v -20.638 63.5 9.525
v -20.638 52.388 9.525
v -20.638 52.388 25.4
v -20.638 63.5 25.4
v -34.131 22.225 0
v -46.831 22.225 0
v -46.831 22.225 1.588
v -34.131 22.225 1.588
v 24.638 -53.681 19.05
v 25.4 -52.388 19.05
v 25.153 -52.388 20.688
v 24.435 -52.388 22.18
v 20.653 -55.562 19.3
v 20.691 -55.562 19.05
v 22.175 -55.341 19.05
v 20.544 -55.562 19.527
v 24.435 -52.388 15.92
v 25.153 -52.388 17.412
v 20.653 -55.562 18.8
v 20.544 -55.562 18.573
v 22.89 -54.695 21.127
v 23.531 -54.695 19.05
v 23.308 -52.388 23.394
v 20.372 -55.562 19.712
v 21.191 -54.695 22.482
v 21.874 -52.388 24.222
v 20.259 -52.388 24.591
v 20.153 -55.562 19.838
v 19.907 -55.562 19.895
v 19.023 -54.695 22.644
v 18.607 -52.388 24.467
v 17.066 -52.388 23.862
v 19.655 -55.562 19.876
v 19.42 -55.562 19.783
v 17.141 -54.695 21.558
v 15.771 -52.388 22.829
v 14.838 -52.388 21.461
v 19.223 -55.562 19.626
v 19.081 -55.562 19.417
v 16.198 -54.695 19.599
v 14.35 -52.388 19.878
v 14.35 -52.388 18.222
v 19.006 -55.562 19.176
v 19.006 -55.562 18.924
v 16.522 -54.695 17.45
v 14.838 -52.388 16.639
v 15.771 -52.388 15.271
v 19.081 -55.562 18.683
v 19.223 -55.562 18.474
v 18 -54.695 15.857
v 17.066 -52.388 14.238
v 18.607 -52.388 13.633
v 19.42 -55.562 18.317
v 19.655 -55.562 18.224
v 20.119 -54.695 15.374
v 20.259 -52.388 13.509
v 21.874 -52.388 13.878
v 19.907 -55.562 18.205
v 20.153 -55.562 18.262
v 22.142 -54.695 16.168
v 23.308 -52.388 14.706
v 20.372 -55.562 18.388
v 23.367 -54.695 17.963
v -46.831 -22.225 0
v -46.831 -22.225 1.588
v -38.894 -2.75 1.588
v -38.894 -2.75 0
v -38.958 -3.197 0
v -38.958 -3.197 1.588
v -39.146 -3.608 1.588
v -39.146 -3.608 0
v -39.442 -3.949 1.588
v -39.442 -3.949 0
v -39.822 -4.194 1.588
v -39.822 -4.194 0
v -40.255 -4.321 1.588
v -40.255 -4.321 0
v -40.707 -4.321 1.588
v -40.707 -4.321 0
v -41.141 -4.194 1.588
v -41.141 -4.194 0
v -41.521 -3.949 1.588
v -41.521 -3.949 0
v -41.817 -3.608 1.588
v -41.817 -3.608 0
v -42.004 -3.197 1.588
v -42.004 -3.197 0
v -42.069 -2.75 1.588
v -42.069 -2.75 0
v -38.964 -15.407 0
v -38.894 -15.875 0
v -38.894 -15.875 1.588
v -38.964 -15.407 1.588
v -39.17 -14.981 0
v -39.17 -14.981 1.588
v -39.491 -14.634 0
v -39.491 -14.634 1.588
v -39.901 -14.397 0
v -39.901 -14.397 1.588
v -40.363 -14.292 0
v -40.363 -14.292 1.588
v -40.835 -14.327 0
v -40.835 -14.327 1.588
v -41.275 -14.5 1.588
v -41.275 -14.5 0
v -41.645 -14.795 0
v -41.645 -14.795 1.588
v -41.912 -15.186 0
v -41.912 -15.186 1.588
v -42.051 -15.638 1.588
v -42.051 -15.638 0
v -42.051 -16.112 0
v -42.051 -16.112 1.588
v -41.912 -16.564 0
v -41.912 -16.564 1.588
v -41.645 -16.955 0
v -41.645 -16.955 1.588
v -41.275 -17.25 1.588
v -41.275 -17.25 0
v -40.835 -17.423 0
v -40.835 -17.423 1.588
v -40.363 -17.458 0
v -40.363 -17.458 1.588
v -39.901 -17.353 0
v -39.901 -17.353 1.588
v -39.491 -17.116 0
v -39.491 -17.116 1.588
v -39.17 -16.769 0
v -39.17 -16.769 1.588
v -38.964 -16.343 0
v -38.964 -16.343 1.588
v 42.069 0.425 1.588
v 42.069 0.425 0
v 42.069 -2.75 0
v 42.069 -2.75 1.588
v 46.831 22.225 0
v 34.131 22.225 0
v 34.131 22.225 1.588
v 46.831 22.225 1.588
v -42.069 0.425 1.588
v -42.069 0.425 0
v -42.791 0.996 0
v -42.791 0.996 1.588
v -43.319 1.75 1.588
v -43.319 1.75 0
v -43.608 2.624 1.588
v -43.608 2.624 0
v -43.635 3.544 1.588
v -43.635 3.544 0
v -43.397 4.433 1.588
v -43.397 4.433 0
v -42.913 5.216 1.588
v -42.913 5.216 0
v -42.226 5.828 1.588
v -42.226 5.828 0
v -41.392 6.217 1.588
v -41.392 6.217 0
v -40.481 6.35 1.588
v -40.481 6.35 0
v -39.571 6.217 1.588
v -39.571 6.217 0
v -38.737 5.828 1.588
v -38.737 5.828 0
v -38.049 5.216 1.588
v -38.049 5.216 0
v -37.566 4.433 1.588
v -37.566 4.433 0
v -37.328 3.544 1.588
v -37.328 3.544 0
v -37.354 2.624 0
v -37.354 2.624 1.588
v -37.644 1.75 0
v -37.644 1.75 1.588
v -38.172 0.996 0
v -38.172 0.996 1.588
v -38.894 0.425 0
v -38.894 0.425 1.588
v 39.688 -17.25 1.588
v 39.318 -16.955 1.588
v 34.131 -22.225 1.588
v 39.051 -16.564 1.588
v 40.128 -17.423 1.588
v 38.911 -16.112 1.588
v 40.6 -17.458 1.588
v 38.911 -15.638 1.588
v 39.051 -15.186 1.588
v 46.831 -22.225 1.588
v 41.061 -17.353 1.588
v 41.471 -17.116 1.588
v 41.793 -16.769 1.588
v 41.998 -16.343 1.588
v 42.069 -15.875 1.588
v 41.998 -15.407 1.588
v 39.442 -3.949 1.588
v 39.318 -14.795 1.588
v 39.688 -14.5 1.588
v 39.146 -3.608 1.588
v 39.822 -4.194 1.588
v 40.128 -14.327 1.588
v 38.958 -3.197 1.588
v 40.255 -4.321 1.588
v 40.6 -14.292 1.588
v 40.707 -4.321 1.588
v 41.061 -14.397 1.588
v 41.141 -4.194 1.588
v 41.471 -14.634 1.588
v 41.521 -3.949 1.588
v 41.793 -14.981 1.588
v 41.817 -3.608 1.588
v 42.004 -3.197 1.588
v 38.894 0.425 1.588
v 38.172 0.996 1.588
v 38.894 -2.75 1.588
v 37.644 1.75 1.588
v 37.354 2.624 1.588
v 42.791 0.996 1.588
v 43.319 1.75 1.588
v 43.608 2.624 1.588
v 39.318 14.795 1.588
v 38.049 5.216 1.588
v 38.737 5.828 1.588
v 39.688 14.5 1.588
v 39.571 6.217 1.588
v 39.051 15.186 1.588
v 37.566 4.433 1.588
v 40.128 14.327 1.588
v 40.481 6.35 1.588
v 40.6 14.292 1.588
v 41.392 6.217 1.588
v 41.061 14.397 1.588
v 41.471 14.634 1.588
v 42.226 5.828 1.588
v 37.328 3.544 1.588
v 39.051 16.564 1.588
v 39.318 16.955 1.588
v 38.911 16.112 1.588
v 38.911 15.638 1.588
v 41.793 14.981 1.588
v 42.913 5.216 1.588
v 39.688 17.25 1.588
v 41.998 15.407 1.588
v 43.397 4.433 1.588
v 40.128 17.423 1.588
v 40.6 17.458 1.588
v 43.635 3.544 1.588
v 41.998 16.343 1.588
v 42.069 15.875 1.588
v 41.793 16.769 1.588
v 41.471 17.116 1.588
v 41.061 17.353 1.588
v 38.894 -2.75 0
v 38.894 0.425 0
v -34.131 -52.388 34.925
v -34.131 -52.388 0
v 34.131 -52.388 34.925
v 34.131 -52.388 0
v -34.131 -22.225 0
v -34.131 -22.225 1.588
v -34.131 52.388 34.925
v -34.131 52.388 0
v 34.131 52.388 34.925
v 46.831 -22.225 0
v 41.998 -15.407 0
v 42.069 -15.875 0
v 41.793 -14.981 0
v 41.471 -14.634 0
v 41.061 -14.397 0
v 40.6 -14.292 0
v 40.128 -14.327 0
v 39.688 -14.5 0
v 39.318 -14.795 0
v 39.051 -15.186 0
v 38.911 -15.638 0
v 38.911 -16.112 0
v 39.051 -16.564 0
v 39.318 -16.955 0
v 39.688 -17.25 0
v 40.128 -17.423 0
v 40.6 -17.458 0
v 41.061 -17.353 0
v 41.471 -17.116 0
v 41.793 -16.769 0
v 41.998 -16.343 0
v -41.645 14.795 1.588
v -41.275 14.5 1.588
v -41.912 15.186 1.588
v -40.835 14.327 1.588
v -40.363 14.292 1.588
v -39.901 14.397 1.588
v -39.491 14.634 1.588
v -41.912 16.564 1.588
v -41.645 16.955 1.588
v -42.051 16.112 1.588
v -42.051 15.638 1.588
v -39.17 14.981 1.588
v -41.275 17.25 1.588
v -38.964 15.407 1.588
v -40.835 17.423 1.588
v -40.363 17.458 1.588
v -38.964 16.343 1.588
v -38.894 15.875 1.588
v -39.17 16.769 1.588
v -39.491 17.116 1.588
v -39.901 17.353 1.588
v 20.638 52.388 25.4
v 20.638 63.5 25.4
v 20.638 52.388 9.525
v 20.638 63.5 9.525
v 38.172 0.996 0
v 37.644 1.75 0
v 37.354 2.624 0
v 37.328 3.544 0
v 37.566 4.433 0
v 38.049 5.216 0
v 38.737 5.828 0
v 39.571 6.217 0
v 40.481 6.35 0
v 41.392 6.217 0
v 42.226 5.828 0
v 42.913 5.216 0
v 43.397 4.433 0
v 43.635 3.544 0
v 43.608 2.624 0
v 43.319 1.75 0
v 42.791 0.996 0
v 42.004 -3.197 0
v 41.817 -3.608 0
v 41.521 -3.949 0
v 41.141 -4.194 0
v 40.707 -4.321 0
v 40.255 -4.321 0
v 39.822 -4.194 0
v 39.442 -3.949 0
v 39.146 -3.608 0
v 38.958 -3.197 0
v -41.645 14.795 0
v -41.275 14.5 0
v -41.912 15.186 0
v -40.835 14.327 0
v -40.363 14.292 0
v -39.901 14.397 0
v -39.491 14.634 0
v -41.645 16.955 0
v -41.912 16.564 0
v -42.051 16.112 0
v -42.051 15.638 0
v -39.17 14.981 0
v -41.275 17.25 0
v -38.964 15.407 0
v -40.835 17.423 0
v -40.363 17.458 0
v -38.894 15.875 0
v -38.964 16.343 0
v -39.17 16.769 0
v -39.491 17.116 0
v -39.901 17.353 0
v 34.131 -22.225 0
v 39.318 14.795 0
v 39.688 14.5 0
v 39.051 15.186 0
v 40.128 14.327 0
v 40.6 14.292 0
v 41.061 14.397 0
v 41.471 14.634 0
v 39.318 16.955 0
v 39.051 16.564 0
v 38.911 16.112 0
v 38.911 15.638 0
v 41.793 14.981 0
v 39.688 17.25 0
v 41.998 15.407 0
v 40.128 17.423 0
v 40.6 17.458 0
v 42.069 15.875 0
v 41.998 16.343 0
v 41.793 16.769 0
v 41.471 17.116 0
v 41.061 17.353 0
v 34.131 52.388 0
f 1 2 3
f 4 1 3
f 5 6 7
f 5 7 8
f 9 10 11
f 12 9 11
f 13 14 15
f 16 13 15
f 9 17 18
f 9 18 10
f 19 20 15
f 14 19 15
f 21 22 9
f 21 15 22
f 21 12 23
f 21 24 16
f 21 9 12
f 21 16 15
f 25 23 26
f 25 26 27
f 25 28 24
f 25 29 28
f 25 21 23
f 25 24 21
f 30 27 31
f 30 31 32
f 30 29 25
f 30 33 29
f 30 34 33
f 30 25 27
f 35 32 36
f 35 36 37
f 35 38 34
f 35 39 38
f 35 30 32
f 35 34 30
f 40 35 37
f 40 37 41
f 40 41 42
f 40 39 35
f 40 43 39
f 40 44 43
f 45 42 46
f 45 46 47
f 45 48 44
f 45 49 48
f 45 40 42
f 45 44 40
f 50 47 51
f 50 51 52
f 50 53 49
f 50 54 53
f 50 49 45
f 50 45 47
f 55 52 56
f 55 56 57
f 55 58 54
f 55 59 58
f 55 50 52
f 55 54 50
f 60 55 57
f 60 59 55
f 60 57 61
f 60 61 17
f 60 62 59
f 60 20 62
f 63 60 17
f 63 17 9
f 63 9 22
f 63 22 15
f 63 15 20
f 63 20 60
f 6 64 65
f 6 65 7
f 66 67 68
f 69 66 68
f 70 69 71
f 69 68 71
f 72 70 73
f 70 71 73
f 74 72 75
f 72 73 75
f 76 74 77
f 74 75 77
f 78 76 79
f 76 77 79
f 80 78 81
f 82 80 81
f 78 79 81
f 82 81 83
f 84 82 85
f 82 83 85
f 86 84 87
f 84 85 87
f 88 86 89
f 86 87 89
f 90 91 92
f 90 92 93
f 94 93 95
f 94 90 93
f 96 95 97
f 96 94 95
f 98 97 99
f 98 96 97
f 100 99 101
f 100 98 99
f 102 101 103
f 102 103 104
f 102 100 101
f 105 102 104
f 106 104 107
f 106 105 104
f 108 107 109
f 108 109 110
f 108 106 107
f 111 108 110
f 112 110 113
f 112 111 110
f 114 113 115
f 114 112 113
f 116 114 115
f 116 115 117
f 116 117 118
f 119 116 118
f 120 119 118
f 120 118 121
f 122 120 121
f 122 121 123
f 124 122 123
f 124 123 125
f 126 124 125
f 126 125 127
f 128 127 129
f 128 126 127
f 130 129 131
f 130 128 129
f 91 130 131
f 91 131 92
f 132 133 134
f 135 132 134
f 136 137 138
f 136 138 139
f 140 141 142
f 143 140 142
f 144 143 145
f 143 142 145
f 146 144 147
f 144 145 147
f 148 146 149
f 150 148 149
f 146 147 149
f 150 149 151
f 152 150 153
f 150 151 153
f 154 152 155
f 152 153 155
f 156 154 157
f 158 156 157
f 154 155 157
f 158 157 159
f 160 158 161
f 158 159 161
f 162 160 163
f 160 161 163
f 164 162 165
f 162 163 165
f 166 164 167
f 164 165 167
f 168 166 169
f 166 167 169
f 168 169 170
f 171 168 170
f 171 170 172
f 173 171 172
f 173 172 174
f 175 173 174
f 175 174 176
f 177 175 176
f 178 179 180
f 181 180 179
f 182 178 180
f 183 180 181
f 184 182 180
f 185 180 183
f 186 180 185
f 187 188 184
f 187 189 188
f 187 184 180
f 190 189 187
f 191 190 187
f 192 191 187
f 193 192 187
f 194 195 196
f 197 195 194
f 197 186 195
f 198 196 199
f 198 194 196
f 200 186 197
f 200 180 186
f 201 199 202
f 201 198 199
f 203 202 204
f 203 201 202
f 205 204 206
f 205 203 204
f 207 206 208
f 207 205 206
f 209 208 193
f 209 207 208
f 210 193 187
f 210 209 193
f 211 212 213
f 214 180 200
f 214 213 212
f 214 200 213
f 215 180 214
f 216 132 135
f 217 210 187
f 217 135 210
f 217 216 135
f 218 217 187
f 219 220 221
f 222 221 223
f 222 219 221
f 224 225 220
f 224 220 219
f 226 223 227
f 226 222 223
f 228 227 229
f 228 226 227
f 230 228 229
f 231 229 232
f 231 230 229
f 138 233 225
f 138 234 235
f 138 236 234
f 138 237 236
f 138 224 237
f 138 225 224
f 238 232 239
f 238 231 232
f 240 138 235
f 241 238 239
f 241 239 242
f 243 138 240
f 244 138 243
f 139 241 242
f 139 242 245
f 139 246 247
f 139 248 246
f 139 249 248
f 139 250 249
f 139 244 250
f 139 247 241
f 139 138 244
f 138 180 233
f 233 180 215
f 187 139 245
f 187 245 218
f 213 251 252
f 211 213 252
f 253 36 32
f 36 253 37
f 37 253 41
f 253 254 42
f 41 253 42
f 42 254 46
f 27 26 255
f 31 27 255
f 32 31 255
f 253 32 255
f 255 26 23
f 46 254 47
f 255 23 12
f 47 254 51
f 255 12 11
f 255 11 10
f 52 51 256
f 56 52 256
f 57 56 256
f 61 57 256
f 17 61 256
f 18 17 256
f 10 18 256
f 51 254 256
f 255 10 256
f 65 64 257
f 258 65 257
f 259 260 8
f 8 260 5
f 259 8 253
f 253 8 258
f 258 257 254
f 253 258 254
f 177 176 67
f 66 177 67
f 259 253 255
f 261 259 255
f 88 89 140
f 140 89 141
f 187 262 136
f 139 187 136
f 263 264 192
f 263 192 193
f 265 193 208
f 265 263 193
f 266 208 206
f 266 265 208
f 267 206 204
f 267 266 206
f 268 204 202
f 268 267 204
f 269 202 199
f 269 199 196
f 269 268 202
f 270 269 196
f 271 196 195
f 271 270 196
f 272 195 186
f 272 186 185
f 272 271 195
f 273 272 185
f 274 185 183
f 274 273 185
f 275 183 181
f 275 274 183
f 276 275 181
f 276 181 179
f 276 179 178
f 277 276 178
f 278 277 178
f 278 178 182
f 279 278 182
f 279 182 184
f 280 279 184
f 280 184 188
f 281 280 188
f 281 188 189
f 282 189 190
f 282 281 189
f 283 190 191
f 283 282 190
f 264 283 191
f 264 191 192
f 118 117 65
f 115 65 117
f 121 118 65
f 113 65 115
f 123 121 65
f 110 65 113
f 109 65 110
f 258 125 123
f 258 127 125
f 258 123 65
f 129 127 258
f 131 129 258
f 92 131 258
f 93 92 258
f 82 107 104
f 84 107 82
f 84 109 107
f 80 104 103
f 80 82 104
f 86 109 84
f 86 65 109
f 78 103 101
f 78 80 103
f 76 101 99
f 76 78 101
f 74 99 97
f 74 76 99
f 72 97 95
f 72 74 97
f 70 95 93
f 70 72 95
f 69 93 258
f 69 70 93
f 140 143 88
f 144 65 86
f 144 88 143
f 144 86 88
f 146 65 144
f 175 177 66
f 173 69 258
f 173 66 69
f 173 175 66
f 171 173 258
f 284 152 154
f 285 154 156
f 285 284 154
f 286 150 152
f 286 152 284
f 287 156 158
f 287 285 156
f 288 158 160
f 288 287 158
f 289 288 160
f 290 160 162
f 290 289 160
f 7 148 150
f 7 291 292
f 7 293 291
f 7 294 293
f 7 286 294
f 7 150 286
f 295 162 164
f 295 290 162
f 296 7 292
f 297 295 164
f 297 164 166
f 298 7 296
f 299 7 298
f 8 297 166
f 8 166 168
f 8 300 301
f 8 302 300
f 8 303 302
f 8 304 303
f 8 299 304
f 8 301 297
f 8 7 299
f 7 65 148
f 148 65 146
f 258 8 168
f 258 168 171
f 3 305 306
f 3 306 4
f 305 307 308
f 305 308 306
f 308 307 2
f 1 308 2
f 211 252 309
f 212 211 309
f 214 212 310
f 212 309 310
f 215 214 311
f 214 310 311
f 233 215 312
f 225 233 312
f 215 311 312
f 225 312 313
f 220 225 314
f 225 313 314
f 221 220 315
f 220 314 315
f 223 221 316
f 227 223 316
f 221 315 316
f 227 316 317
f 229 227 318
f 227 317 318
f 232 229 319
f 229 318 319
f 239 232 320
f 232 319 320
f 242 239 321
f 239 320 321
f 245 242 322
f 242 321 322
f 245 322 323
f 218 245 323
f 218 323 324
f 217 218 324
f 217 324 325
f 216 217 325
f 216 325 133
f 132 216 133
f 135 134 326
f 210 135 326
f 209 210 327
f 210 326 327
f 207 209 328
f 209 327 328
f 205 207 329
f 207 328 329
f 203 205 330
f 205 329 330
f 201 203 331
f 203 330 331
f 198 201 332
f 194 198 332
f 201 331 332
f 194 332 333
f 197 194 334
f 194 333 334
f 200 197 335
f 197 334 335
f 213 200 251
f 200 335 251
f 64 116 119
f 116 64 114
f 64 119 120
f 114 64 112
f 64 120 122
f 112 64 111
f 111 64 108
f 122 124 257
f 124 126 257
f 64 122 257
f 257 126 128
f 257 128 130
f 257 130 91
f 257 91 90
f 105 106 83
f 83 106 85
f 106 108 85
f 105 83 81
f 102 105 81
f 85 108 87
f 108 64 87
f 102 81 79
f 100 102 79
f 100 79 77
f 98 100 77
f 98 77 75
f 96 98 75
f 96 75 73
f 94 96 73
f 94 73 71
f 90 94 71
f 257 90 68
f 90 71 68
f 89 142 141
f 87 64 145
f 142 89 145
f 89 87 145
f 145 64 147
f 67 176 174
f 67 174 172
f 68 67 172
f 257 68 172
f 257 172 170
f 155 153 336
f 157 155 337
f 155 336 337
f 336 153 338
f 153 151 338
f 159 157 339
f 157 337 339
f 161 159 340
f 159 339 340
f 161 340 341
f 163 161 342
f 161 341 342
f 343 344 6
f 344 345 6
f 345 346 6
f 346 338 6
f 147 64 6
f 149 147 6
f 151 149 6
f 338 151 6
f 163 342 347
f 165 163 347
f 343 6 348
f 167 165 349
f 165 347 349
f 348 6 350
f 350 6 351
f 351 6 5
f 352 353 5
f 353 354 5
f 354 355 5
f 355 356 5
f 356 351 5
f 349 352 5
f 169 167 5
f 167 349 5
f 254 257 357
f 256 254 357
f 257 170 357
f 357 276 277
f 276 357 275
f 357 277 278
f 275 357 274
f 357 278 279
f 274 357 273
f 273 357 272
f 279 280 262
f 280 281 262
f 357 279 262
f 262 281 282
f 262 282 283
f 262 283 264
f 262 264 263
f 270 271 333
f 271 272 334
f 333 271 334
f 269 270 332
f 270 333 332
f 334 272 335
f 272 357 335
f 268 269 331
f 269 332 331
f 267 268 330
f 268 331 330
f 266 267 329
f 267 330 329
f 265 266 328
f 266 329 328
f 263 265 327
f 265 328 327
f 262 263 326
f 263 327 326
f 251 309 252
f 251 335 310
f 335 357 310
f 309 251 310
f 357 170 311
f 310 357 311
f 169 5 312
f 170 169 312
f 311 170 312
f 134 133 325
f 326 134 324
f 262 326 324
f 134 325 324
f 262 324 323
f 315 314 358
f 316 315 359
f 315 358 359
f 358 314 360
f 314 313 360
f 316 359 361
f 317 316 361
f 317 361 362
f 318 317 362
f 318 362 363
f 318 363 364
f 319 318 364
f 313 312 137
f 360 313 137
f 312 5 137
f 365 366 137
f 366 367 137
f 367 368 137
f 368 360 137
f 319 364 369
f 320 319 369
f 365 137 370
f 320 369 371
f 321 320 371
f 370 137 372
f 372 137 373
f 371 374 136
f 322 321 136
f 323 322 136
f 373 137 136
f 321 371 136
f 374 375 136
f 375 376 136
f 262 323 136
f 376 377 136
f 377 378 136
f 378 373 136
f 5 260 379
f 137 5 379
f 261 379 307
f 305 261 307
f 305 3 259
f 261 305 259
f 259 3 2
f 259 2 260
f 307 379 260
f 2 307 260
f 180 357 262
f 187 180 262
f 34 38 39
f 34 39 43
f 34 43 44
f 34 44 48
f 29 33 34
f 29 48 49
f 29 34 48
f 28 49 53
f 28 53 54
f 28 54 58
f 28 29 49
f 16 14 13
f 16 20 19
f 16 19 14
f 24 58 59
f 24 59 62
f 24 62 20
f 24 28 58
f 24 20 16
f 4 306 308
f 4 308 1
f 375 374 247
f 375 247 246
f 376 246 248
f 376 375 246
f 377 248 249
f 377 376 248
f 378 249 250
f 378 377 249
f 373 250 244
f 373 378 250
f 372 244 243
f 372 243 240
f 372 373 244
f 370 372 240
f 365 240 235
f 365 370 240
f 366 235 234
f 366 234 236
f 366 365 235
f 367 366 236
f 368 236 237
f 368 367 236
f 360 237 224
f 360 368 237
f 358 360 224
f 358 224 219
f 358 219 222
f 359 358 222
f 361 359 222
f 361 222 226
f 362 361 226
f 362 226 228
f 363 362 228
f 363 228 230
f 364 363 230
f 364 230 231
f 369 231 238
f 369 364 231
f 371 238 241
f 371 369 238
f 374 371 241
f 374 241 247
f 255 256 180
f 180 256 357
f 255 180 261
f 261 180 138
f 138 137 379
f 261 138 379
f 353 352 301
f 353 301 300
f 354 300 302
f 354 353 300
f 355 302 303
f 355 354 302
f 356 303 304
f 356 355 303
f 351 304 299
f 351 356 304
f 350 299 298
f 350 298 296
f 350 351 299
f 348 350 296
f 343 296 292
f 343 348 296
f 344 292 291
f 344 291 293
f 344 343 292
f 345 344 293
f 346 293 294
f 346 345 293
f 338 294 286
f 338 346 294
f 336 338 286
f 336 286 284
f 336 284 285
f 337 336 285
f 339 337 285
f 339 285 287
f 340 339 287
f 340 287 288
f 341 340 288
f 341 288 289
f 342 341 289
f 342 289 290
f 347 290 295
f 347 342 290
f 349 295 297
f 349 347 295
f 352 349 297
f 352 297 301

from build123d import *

# Parameters (mm, degrees)
F1_DEPTH = 34.925
F0_W     = 12.7
F0_H     = 44.45
F0_R     = 1.5875
F2_DEPTH = 1.5875
F3_W     = 41.275
F3_H     = 15.875
F4_DEPTH = 11.1125
F5_R     = 5.55625
F6_DEPTH = 3.175


# Not quite as in the source:
# - a fillet or chamfer that OpenCascade refuses, or shapes differently, is made with other operations: its cross-section is extruded or revolved along the edge and cut away or added


with BuildPart() as f1:
    # F0 (on Top) → F1 (new body)
    with BuildSketch(Plane.XY):
        Polygon((34.13125, 22.225), (34.13125, 52.3875), (-34.13125, 52.3875), (-34.13125, 22.225), (-34.13125, -22.225), (-34.13125, -52.3875), (34.13125, -52.3875), (34.13125, -22.225), align=None)
    extrude(amount=F1_DEPTH)

    # F0 (on Top) → F2 (join)
    with BuildSketch(Plane.XY):
        with Locations((-40.48125, 0)):
            Rectangle(F0_W, F0_H)
        with Locations((-40.48125, -15.875)):
            Circle(F0_R, mode=Mode.SUBTRACT)
        with BuildLine():
            Line((-38.89375, 0.425369343), (-38.89375, -2.749630657))
            ThreePointArc((-38.89375, -2.749630657), (-40.48125, -4.337130657), (-42.06875, -2.749630657))
            Line((-42.06875, -2.749630657), (-42.06875, 0.425369343))
            ThreePointArc((-42.06875, 0.425369343), (-40.48125, 6.35), (-38.89375, 0.425369343))
        make_face(mode=Mode.SUBTRACT)
        with Locations((-40.48125, 15.875)):
            Circle(F0_R, mode=Mode.SUBTRACT)
        with Locations((40.48125, 0)):
            Rectangle(F0_W, F0_H)
        with Locations((40.48125, -15.875)):
            Circle(F0_R, mode=Mode.SUBTRACT)
        with BuildLine():
            ThreePointArc((38.89375, 0.425369343), (40.48125, 6.35), (42.06875, 0.425369343))
            Line((42.06875, 0.425369343), (42.06875, -2.749630657))
            ThreePointArc((42.06875, -2.749630657), (40.48125, -4.337130657), (38.89375, -2.749630657))
            Line((38.89375, -2.749630657), (38.89375, 0.425369343))
        make_face(mode=Mode.SUBTRACT)
        with Locations((40.48125, 15.875)):
            Circle(F0_R, mode=Mode.SUBTRACT)
    extrude(amount=F2_DEPTH)

    # F3 (on face) → F4 (join)
    with BuildSketch(Plane(origin=(0, 52.3875, 0), x_dir=(-1, 0, 0), z_dir=(0, 1, 0))):
        with Locations((0, 17.4625)):
            Rectangle(F3_W, F3_H)
    extrude(amount=F4_DEPTH)

    # F5 (on face) → F6 (join)
    with BuildSketch(Plane.XZ.offset(52.3875)):
        with Locations((19.84375, 19.05)):
            Circle(F5_R)
    extrude(amount=F6_DEPTH)

    # F7: fillet of radius 5.08 on 1 edges, made by hand

    # F7_s1 → F7_t2 (revolve, cut)
    with BuildSketch(Plane.XY.offset(19.05)):
        with BuildLine():
            ThreePointArc((25.4, -52.3875), (23.5305202921, -54.6946134838), (20.6907139607, -55.5625))
            Line((20.6907139607, -55.5625), (25.4, -55.5625))
            Line((25.4, -55.5625), (25.4, -52.3875))
        make_face()
    revolve(axis=Axis((19.84375, -55.5625, 19.05), (0, -1, 0)), mode=Mode.SUBTRACT)


solid = f1.part
